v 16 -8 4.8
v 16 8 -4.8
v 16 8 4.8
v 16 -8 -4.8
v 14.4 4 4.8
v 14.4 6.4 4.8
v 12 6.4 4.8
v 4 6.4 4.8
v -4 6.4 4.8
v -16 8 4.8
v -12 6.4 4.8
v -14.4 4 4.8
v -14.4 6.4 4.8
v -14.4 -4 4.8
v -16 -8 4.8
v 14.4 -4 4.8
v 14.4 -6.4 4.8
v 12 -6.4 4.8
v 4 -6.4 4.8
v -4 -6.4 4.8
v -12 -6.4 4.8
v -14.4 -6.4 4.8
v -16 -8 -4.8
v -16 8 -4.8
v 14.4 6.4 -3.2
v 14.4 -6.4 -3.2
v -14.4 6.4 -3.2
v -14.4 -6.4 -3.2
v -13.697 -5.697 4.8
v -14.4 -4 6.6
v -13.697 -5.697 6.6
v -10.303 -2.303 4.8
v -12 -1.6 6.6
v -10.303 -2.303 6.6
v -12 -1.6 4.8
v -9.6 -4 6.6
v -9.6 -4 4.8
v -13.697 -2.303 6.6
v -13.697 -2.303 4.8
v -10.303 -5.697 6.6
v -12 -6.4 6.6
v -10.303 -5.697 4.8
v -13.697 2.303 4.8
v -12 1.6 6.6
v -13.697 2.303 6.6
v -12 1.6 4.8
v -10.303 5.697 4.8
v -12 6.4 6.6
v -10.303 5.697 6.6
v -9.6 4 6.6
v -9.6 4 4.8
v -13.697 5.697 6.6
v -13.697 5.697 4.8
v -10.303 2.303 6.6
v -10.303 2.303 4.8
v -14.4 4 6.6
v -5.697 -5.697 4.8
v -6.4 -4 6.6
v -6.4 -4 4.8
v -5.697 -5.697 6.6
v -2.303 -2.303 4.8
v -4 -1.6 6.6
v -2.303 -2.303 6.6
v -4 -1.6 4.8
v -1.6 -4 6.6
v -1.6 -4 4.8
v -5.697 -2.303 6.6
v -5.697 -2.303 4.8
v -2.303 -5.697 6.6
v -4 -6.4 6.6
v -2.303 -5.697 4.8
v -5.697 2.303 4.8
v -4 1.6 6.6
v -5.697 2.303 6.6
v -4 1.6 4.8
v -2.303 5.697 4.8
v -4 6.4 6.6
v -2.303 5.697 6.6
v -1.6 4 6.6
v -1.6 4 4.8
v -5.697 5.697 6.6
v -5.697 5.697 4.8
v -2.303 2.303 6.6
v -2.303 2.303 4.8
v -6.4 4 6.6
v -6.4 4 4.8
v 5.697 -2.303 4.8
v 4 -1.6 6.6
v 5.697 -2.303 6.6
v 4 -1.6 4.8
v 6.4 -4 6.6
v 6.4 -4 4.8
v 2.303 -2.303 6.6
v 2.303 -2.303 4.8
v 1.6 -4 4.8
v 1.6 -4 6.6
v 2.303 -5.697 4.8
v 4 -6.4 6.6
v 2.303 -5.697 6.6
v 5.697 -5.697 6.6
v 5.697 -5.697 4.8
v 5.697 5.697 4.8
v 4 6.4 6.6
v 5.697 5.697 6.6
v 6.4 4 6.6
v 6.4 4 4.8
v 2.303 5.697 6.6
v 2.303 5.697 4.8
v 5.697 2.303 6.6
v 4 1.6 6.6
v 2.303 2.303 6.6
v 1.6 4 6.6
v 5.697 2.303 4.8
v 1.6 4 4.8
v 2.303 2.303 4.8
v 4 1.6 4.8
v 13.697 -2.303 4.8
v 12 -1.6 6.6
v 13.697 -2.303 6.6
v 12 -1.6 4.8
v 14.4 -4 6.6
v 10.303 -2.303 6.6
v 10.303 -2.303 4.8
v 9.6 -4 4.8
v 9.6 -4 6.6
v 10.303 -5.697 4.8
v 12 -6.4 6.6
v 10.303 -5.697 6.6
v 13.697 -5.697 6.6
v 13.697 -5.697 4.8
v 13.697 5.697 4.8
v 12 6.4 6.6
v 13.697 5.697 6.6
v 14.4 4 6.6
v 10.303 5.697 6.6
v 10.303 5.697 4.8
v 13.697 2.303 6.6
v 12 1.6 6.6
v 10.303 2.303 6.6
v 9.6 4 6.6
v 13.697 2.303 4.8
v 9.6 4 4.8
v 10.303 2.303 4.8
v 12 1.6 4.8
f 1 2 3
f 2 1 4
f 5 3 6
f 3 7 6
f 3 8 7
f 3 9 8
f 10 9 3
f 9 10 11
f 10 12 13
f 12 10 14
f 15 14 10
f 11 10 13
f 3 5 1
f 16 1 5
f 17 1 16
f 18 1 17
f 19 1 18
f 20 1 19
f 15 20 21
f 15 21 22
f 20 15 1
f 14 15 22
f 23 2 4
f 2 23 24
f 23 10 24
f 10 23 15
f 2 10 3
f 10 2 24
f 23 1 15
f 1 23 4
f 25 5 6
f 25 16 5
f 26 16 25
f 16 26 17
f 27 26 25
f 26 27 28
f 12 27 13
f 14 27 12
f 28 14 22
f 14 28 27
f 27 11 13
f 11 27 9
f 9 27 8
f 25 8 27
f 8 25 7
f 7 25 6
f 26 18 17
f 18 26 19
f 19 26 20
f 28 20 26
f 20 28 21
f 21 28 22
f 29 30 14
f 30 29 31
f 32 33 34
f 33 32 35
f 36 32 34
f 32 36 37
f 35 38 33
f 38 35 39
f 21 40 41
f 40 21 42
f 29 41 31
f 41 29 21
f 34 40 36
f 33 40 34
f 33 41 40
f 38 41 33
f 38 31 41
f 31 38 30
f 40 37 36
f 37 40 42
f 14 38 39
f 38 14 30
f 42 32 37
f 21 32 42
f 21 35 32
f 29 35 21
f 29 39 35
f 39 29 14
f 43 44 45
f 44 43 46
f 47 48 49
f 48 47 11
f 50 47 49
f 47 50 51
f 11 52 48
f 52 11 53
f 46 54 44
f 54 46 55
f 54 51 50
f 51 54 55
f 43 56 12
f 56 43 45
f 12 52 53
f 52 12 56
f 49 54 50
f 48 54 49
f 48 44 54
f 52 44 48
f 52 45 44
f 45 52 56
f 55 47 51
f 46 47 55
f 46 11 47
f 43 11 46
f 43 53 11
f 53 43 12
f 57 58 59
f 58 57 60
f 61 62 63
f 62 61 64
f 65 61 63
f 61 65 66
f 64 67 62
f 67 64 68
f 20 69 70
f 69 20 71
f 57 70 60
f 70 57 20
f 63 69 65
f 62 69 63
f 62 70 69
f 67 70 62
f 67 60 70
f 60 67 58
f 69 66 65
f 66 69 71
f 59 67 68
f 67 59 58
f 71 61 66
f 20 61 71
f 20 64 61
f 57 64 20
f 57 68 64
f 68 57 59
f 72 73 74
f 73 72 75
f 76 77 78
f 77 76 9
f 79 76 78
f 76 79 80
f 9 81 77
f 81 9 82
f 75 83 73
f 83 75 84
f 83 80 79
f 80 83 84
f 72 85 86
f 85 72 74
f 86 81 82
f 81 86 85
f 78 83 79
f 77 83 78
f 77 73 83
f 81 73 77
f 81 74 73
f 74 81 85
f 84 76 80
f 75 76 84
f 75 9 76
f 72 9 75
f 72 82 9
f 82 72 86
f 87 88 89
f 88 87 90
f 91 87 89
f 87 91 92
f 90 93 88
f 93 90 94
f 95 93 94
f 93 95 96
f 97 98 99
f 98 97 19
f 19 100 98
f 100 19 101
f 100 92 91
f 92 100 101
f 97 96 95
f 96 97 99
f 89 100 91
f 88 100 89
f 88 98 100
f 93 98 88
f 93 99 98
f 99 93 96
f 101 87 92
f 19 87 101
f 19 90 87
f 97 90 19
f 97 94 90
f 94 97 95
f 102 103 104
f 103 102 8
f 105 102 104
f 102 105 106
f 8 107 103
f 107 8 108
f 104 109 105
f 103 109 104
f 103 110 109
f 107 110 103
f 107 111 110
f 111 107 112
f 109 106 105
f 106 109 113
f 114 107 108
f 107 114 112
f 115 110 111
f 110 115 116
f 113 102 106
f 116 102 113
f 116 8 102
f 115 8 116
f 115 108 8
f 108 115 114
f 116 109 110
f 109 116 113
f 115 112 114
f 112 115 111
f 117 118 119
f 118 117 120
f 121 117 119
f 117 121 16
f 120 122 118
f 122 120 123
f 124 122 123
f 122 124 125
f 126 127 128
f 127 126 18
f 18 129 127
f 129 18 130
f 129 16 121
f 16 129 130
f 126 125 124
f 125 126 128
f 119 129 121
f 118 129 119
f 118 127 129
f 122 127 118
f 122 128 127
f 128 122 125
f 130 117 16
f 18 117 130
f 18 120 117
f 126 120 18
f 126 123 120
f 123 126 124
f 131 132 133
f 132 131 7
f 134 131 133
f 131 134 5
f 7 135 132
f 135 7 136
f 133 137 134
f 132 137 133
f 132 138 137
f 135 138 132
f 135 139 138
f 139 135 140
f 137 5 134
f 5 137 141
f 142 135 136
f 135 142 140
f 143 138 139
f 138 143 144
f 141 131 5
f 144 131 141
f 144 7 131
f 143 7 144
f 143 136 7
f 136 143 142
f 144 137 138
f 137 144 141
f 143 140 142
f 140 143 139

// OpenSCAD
// 3DScad sample: LEGO-compatible brick (4x2 studs)
// Uses only the currently round-trippable subset.

module scene_model() {
    nx = 4;
    ny = 2;
    pitch = 8;
    wall = 1.6;
    plate_h = 9.6;
    stud_r = 2.4;
    stud_h = 1.8;

    union() {
        difference() {
            cube([nx * pitch, ny * pitch, plate_h], center=true);
            translate([0, 0, wall]) {
                cube([nx * pitch - wall * 2, ny * pitch - wall * 2, plate_h], center=true);
            }
        }
        for (ix = [0 : 1 : nx - 1]) {
            for (iy = [0 : 1 : ny - 1]) {
                translate([-(nx - 1) * pitch / 2 + ix * pitch, -(ny - 1) * pitch / 2 + iy * pitch, plate_h / 2 + stud_h / 2]) {
                    cylinder(h=stud_h, r=stud_r, center=true);
                }
            }
        }
    }
}

scene_model();
